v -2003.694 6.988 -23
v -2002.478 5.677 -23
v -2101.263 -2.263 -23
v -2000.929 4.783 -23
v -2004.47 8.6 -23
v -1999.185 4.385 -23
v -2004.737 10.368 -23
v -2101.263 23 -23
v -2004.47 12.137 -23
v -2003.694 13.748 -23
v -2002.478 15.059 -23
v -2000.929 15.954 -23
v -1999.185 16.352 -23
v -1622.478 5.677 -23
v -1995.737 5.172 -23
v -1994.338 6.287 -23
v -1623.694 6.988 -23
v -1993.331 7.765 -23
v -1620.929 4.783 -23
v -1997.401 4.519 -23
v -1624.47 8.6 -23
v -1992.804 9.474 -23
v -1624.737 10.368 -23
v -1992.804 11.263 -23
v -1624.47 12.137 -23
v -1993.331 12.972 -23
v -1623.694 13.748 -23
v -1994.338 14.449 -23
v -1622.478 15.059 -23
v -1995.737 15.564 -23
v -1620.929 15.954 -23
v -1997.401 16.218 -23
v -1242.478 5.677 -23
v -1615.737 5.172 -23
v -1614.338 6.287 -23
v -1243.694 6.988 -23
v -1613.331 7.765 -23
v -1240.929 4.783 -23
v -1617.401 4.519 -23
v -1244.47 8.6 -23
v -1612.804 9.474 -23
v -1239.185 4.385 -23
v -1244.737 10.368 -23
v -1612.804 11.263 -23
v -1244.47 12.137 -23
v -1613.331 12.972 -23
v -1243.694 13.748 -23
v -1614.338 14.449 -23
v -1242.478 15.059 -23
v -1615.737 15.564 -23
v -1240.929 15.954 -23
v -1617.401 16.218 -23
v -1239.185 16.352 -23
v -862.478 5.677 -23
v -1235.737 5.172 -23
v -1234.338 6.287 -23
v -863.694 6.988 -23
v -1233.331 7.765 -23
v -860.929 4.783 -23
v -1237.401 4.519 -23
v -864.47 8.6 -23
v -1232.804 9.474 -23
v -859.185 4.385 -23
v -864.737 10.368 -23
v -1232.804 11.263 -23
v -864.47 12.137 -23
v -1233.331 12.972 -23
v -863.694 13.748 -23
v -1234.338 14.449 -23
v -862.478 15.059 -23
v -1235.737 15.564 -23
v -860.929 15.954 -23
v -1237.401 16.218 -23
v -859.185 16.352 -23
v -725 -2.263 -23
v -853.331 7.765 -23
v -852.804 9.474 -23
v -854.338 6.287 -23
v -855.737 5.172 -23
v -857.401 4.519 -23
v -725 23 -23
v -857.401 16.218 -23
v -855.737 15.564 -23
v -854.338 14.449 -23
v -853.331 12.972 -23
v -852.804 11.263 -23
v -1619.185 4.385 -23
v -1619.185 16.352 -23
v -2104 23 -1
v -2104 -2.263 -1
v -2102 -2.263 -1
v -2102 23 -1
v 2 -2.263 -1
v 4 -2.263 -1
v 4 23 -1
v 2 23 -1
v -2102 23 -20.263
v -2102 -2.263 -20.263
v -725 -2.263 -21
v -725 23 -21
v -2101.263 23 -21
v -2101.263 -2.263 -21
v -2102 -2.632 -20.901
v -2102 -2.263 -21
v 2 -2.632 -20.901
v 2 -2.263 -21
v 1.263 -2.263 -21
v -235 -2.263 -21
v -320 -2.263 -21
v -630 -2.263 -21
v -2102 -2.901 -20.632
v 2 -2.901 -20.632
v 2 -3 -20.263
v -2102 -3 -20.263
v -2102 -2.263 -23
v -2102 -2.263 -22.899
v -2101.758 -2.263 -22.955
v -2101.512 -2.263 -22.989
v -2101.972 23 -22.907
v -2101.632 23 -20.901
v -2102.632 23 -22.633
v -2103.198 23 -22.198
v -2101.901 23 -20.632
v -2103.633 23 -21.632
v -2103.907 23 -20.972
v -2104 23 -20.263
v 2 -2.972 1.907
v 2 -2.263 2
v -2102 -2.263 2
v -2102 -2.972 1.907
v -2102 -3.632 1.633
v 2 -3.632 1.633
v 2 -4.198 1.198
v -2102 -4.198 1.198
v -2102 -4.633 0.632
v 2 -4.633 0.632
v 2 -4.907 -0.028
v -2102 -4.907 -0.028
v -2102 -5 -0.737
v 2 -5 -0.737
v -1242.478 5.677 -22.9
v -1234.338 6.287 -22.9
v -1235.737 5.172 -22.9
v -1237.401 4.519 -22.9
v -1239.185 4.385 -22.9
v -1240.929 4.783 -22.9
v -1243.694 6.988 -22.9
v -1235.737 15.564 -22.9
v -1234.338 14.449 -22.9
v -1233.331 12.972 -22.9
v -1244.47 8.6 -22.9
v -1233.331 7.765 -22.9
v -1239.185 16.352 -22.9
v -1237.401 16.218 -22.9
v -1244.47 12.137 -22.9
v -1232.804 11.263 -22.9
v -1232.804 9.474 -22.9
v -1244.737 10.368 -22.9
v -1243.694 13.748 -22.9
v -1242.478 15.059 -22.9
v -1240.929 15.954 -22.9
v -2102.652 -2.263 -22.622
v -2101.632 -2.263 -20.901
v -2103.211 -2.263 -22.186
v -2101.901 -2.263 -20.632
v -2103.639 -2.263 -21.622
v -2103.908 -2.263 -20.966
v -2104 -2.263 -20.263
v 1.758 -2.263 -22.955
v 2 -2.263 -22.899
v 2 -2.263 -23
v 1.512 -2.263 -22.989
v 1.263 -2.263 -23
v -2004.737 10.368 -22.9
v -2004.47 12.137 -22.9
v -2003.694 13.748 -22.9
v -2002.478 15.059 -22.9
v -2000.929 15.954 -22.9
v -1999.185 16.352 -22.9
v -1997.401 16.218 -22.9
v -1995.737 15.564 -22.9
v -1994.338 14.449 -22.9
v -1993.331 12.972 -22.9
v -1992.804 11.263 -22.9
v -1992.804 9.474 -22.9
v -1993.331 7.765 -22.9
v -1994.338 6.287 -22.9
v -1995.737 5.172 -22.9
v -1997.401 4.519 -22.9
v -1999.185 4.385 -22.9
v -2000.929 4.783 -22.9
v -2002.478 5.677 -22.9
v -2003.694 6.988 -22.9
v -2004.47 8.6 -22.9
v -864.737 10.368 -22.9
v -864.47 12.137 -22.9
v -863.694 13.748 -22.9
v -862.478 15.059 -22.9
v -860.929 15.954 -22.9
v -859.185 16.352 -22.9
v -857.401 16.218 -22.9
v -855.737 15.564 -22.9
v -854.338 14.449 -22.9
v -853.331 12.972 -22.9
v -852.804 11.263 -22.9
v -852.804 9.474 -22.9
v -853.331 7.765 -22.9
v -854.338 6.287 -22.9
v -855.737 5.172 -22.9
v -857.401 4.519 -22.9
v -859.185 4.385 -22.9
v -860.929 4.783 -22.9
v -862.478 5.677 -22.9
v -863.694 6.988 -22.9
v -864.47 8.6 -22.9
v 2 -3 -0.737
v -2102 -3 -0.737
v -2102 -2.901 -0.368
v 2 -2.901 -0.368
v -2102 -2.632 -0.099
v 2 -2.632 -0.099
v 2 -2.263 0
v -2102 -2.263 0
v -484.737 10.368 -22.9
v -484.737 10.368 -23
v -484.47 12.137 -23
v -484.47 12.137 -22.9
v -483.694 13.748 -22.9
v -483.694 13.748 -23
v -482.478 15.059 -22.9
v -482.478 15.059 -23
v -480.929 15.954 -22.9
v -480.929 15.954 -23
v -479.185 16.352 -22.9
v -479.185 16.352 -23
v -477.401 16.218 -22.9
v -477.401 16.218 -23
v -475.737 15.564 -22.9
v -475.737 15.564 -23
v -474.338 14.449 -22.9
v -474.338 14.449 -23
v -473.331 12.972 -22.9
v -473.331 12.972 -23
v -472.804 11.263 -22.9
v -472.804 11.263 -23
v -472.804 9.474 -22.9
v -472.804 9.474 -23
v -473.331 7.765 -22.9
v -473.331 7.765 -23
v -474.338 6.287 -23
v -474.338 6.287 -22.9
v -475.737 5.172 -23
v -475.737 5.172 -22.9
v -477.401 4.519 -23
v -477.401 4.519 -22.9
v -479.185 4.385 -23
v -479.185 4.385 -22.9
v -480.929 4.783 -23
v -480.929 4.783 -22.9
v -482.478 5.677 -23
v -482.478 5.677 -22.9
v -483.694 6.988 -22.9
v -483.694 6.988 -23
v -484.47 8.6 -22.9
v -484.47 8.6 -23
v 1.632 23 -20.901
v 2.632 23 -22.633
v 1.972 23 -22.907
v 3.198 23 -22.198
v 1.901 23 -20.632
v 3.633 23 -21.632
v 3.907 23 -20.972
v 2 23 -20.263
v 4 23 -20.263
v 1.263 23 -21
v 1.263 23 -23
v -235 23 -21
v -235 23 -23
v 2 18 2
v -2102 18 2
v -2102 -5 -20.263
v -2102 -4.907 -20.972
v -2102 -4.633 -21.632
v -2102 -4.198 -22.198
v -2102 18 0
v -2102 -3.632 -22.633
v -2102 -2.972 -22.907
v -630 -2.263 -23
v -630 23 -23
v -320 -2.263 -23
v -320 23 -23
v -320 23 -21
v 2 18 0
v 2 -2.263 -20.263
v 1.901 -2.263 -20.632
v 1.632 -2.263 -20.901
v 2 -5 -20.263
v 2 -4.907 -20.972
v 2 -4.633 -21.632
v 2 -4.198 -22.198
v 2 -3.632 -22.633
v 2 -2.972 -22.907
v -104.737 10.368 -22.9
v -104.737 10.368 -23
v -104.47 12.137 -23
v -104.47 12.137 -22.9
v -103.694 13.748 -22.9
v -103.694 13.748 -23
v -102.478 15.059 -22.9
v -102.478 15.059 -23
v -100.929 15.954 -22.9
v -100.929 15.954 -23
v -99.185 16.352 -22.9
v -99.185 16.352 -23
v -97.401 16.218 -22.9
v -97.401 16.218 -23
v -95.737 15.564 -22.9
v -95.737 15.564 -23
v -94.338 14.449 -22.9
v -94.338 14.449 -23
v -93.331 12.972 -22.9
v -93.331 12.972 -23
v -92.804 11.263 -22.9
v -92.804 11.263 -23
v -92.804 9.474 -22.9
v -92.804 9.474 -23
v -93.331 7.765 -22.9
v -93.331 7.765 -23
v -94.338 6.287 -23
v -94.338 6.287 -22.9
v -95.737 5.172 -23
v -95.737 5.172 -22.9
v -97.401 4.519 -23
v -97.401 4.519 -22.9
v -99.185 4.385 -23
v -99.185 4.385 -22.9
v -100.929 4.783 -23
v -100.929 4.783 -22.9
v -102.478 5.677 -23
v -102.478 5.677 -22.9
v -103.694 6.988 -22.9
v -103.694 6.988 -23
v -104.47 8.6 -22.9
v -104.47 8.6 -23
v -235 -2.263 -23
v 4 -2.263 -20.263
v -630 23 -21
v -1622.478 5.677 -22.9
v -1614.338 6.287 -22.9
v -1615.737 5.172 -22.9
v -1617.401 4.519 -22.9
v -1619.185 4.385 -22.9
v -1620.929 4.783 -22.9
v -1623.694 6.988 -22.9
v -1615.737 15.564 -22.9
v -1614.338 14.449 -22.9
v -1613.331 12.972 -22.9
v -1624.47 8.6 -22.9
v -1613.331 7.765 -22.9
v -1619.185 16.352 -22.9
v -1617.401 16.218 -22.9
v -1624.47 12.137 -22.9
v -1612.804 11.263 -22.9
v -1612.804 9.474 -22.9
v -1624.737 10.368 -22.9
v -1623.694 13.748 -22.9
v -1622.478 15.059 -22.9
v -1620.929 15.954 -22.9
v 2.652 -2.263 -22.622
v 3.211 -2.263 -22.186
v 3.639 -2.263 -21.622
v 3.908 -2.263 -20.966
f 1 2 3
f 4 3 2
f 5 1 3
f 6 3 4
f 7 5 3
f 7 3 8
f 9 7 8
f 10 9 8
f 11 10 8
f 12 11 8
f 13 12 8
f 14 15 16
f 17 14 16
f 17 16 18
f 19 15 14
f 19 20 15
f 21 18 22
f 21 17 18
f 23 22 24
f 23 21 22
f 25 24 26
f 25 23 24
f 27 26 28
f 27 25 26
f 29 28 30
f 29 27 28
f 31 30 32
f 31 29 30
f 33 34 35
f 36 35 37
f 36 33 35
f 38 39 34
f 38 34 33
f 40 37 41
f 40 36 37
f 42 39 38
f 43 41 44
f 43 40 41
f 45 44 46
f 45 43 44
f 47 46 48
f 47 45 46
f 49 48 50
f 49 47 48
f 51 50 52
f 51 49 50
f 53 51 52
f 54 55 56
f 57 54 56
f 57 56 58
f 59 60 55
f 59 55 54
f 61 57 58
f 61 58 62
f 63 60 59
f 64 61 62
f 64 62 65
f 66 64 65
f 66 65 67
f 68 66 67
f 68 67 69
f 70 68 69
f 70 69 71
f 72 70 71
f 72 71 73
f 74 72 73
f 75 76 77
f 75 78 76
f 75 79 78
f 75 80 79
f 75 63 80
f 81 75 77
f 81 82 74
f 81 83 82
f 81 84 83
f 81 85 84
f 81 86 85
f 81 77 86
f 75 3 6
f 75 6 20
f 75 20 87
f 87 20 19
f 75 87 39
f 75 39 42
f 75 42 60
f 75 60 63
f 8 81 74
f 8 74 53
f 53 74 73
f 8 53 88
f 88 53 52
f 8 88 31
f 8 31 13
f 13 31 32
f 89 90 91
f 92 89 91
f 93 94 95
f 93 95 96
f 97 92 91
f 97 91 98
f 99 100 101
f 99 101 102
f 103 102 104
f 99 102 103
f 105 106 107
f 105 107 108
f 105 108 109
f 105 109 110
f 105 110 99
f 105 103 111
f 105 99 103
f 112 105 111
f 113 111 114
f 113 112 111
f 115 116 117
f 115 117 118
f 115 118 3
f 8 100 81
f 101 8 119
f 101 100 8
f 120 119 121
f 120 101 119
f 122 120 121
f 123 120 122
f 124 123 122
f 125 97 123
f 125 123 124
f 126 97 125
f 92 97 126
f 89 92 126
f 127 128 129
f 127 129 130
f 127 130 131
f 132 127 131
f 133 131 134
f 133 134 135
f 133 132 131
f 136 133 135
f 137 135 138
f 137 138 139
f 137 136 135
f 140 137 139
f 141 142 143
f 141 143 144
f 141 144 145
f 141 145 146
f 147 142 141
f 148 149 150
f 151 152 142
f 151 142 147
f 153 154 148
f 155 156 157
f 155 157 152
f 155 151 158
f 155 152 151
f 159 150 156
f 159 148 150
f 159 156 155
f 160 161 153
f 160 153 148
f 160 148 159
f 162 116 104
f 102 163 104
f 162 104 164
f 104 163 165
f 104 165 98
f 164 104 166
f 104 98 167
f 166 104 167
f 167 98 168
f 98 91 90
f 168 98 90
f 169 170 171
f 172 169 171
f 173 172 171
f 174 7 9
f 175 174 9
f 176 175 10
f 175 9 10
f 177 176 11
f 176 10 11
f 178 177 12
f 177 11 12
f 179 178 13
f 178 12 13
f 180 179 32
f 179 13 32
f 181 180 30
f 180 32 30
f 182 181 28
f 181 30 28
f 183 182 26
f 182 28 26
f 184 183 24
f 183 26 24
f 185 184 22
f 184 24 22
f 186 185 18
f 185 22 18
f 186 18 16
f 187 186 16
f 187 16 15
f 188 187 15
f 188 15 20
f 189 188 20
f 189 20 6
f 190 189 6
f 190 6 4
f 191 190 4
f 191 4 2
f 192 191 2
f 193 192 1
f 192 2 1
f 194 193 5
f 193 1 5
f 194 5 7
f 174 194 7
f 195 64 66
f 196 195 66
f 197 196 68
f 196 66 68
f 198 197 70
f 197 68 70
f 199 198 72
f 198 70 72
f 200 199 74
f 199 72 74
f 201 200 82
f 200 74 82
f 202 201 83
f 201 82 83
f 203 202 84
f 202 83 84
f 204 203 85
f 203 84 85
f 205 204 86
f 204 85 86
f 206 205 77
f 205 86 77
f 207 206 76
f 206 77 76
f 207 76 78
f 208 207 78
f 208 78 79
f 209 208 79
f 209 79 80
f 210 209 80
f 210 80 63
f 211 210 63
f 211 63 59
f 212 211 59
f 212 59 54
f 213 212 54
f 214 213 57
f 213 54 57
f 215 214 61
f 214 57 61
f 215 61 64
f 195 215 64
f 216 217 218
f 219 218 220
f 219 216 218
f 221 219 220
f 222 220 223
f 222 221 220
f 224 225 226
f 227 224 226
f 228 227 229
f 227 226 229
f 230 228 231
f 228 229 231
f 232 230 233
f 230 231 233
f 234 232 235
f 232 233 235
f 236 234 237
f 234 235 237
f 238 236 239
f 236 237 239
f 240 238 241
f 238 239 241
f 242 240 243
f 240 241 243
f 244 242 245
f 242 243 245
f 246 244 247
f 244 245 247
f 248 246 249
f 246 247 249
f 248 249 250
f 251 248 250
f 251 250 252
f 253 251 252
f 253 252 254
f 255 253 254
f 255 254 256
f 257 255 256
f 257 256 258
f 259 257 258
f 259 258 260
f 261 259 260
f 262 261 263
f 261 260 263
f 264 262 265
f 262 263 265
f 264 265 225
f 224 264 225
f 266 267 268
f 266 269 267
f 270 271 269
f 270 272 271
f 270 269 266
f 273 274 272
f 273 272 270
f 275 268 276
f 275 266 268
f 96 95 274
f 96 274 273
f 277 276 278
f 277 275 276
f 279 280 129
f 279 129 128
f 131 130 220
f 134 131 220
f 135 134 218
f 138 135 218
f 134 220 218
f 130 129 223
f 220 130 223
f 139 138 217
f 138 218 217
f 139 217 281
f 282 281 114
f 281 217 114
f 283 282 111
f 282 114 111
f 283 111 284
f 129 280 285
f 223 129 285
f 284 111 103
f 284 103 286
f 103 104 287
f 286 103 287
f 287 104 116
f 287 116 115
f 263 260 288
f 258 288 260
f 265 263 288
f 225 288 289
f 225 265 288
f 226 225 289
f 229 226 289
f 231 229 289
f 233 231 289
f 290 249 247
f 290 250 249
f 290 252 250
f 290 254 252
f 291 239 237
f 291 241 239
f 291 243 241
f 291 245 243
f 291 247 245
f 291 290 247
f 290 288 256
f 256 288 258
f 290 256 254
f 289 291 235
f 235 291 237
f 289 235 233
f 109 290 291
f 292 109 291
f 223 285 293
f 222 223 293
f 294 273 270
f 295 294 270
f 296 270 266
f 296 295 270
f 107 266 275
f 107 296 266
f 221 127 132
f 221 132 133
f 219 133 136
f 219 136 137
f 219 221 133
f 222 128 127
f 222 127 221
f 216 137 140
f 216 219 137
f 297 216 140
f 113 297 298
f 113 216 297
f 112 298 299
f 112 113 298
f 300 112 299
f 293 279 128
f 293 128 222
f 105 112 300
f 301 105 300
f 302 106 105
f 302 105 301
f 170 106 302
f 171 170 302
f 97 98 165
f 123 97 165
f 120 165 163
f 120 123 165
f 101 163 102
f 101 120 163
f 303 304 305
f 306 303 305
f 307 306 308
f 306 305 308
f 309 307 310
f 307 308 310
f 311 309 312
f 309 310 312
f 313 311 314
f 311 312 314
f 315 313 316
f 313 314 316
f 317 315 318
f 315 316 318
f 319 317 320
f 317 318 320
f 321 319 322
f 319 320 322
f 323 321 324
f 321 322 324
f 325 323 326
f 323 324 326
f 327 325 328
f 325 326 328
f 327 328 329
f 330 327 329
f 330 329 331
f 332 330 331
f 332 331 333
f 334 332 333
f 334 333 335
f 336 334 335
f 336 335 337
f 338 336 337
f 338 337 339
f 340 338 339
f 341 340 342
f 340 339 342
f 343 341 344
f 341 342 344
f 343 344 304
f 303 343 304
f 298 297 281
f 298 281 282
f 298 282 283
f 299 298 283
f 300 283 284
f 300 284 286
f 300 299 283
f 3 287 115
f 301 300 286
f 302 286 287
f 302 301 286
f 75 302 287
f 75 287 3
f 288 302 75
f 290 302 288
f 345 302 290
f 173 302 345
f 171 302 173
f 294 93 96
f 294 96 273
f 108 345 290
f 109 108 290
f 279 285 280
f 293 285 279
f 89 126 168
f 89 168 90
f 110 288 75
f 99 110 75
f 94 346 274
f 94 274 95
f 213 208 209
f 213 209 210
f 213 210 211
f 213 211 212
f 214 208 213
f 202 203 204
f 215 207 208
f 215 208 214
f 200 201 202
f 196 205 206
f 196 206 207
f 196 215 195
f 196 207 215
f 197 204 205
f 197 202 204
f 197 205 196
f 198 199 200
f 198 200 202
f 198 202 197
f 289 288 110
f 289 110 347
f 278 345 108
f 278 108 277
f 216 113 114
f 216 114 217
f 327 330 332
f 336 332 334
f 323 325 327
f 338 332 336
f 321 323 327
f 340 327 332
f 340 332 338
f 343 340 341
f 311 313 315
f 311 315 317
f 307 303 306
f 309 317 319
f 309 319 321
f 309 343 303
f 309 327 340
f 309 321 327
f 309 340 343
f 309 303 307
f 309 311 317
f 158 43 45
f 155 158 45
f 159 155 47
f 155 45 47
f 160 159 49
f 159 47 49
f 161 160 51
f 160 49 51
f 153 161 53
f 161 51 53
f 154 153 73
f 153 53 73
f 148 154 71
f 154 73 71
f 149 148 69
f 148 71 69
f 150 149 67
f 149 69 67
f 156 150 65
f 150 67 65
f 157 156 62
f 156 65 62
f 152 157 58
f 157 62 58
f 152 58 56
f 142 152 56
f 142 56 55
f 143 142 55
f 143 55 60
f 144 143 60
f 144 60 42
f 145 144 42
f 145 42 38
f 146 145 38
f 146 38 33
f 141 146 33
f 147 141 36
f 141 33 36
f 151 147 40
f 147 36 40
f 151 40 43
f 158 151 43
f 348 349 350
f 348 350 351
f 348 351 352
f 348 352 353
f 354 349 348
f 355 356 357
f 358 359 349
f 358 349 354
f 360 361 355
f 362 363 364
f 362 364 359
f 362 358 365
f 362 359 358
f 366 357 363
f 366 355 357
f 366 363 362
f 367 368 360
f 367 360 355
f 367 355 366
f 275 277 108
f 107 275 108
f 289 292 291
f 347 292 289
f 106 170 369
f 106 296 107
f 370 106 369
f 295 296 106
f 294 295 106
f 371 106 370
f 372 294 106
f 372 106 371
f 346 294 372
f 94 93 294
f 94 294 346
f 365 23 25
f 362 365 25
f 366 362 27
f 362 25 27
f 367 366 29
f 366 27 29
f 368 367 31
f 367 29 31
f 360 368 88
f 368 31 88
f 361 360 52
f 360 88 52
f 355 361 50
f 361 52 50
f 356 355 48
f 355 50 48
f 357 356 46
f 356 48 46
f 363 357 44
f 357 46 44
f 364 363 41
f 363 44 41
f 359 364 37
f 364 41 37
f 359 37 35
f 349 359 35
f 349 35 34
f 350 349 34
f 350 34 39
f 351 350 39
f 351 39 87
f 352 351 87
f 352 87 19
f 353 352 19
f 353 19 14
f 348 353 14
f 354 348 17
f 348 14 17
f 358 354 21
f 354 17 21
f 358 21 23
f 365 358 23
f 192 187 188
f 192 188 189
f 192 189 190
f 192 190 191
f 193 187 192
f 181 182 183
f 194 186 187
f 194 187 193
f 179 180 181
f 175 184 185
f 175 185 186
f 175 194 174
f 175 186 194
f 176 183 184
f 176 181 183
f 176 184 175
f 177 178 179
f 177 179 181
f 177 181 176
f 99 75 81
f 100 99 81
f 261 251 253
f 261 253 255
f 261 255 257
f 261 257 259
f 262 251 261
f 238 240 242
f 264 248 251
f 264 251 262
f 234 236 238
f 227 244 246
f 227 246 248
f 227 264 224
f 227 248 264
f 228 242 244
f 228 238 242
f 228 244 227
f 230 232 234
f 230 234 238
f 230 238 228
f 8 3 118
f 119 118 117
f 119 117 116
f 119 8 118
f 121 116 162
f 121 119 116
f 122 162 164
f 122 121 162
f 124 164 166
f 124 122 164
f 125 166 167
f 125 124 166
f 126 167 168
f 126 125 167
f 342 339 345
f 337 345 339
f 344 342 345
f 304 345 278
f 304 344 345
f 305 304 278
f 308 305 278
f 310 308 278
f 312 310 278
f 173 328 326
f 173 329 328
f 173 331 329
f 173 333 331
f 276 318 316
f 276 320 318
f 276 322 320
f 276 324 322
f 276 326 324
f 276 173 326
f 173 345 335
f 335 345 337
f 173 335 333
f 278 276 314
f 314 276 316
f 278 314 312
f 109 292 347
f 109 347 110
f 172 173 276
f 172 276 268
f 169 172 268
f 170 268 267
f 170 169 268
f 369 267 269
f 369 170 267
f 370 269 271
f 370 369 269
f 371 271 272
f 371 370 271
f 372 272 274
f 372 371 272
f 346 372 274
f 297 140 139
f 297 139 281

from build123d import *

# Parameters (mm, degrees)
SKETCH_1_W                         = 2104
SKETCH_1_H                         = 21
SM_BASE_FLANGE_1_DEPTH             = 2
SM_EDGE_FLANGE_1_STRIP_W           = 9.4732
SM_EDGE_FLANGE_1_STRIP_H           = 2
SM_EDGE_FLANGE_1_STRIP_CUT_DEPTH   = 2104
SM_EDGE_FLANGE_1_DEPTH             = 2104
SM_EDGE_FLANGE_2_STRIP_W           = 9.4732
SM_EDGE_FLANGE_2_STRIP_H           = 2
SM_EDGE_FLANGE_2_STRIP_CUT_DEPTH   = 2104
SM_EDGE_FLANGE_2_DEPTH             = 2104
SM_EDGE_FLANGE_3_STRIP_W           = 9.4732
SM_EDGE_FLANGE_3_STRIP_H           = 2
SM_EDGE_FLANGE_3_STRIP_CUT_DEPTH   = 25.2634
SM_EDGE_FLANGE_3_STRIP_2_W         = 9.4732
SM_EDGE_FLANGE_3_STRIP_2_H         = 2
SM_EDGE_FLANGE_3_STRIP_CUT_2_DEPTH = 25.2634
SM_EDGE_FLANGE_3_DEPTH             = 25.2634
SM_EDGE_FLANGE_3_BEND_DEPTH        = 25.2634
SKETCH_18_W                        = 85
SKETCH_18_H                        = 39.234140159
SKETCH_18_W_2                      = 95
SKETCH_18_H_2                      = 42.308601705
CUT_EXTRUDE_1_DEPTH                = 2
SKETCH_19_R                        = 6
CUT_EXTRUDE_2_DEPTH                = 0.1


# Sheet-metal steps are written as plain solids
with BuildPart() as part:
    # Sketch 1 → 基体-法兰1 (new body)
    with BuildSketch(Plane.XY):
        with Locations((-1050, 7.5)):
            Rectangle(SKETCH_1_W, SKETCH_1_H)
    extrude(amount=SM_BASE_FLANGE_1_DEPTH)

    # 边线-法兰1 strip (across the edge) → 边线-法兰1 strip cut (cut)
    with BuildSketch(Plane(origin=(2, -3, 0), x_dir=(0, 1, 0), z_dir=(-1, 0, 0))):
        with Locations((-4, -1)):
            Rectangle(SM_EDGE_FLANGE_1_STRIP_W, SM_EDGE_FLANGE_1_STRIP_H)
    extrude(amount=SM_EDGE_FLANGE_1_STRIP_CUT_DEPTH, mode=Mode.SUBTRACT)

    # 边线-法兰1 section (across the edge) → 边线-法兰1 (add)
    with BuildSketch(Plane(origin=(2, -3, 0), x_dir=(0, 1, 0), z_dir=(-1, 0, 0))):
        with BuildLine():
            Line((-2, 0.7366), (-2, 21))
            Line((-2, 21), (0, 21))
            Line((0, 21), (0, 0.7366))
            ThreePointArc((0, 0.7366), (0.215745145, 0.215745145), (0.7366, 0))
            Line((0.7366, 0), (0.7366, -2))
            ThreePointArc((0.7366, -2), (-1.198468417, -1.198468417), (-2, 0.7366))
        make_face()
    extrude(amount=SM_EDGE_FLANGE_1_DEPTH)

    # 边线-法兰2 strip (across the edge) → 边线-法兰2 strip cut (cut)
    with BuildSketch(Plane(origin=(2, -3, -21), x_dir=(0, 0, 1), z_dir=(-1, 0, 0))):
        with Locations((-4, -1)):
            Rectangle(SM_EDGE_FLANGE_2_STRIP_W, SM_EDGE_FLANGE_2_STRIP_H)
    extrude(amount=SM_EDGE_FLANGE_2_STRIP_CUT_DEPTH, mode=Mode.SUBTRACT)

    # 边线-法兰2 section (across the edge) → 边线-法兰2 (add)
    with BuildSketch(Plane(origin=(2, -3, -21), x_dir=(0, 0, 1), z_dir=(-1, 0, 0))):
        with BuildLine():
            Line((-2, 0.7366), (-2, 26))
            Line((-2, 26), (0, 26))
            Line((0, 26), (0, 0.7366))
            ThreePointArc((0, 0.7366), (0.215745145, 0.215745145), (0.7366, 0))
            Line((0.7366, 0), (0.7366, -2))
            ThreePointArc((0.7366, -2), (-1.198468417, -1.198468417), (-2, 0.7366))
        make_face()
    extrude(amount=SM_EDGE_FLANGE_2_DEPTH)

    # 边线-法兰3 strip (across the edge) → 边线-法兰3 strip cut (cut)
    with BuildSketch(Plane(origin=(2, -2.2634, -21), x_dir=(-1, 0, 0), z_dir=(0, 1, 0))):
        with Locations((-4, -1)):
            Rectangle(SM_EDGE_FLANGE_3_STRIP_W, SM_EDGE_FLANGE_3_STRIP_H)
    extrude(amount=SM_EDGE_FLANGE_3_STRIP_CUT_DEPTH, mode=Mode.SUBTRACT)

    # 边线-法兰3 strip 2 (across the edge) → 边线-法兰3 strip cut 2 (cut)
    with BuildSketch(Plane(origin=(-2102, 23, -21), x_dir=(1, 0, 0), z_dir=(0, -1, 0))):
        with Locations((-4, -1)):
            Rectangle(SM_EDGE_FLANGE_3_STRIP_2_W, SM_EDGE_FLANGE_3_STRIP_2_H)
    extrude(amount=SM_EDGE_FLANGE_3_STRIP_CUT_2_DEPTH, mode=Mode.SUBTRACT)

    # 边线-法兰3 section (across the edge) → 边线-法兰3 (add)
    with BuildSketch(Plane(origin=(2, -2.2634, -21), x_dir=(-1, 0, 0), z_dir=(0, 1, 0))):
        with BuildLine():
            Line((-2, 0.7366), (-2, 20))
            Line((-2, 20), (0, 20))
            Line((0, 20), (0, 0.7366))
            ThreePointArc((0, 0.7366), (0.215745145, 0.215745145), (0.7366, 0))
            Line((0.7366, 0), (0.7366, -2))
            ThreePointArc((0.7366, -2), (-1.198468417, -1.198468417), (-2, 0.7366))
        make_face()
    extrude(amount=SM_EDGE_FLANGE_3_DEPTH)

    # 边线-法兰3 section 2 (across the edge) → 边线-法兰3 bend (add)
    with BuildSketch(Plane(origin=(-2102, 23, -21), x_dir=(1, 0, 0), z_dir=(0, -1, 0))):
        with BuildLine():
            Line((-2, 0.7366), (-2, 20))
            Line((-2, 20), (0, 20))
            Line((0, 20), (0, 0.7366))
            ThreePointArc((0, 0.7366), (0.215745145, 0.215745145), (0.7366, 0))
            Line((0.7366, 0), (0.7366, -2))
            ThreePointArc((0.7366, -2), (-1.198468417, -1.198468417), (-2, 0.7366))
        make_face()
    extrude(amount=SM_EDGE_FLANGE_3_BEND_DEPTH)

    # 草图18 → 切除-拉伸1 (cut)
    with BuildSketch(Plane(origin=(0, 0, -23), x_dir=(-1, 0, 0), z_dir=(0, 0, -1))):
        with Locations((277.5, 17.35367008)):
            Rectangle(SKETCH_18_W, SKETCH_18_H)
        with Locations((677.5, 18.890900853)):
            Rectangle(SKETCH_18_W_2, SKETCH_18_H_2)
    extrude(amount=-CUT_EXTRUDE_1_DEPTH, mode=Mode.SUBTRACT)

    # 草图19 → 切除-拉伸2 (cut)
    with BuildSketch(Plane(origin=(0, 0, -23), x_dir=(-1, 0, 0), z_dir=(0, 0, -1))):
        with Locations((98.7366, 10.3683)):
            Circle(SKETCH_19_R)
        with Locations((478.7366, 10.3683)):
            Circle(SKETCH_19_R)
        with Locations((858.7366, 10.3683)):
            Circle(SKETCH_19_R)
        with Locations((1238.7366, 10.3683)):
            Circle(SKETCH_19_R)
        with Locations((1618.7366, 10.3683)):
            Circle(SKETCH_19_R)
        with Locations((1998.7366, 10.3683)):
            Circle(SKETCH_19_R)
    extrude(amount=-CUT_EXTRUDE_2_DEPTH, mode=Mode.SUBTRACT)


solid = part.part
